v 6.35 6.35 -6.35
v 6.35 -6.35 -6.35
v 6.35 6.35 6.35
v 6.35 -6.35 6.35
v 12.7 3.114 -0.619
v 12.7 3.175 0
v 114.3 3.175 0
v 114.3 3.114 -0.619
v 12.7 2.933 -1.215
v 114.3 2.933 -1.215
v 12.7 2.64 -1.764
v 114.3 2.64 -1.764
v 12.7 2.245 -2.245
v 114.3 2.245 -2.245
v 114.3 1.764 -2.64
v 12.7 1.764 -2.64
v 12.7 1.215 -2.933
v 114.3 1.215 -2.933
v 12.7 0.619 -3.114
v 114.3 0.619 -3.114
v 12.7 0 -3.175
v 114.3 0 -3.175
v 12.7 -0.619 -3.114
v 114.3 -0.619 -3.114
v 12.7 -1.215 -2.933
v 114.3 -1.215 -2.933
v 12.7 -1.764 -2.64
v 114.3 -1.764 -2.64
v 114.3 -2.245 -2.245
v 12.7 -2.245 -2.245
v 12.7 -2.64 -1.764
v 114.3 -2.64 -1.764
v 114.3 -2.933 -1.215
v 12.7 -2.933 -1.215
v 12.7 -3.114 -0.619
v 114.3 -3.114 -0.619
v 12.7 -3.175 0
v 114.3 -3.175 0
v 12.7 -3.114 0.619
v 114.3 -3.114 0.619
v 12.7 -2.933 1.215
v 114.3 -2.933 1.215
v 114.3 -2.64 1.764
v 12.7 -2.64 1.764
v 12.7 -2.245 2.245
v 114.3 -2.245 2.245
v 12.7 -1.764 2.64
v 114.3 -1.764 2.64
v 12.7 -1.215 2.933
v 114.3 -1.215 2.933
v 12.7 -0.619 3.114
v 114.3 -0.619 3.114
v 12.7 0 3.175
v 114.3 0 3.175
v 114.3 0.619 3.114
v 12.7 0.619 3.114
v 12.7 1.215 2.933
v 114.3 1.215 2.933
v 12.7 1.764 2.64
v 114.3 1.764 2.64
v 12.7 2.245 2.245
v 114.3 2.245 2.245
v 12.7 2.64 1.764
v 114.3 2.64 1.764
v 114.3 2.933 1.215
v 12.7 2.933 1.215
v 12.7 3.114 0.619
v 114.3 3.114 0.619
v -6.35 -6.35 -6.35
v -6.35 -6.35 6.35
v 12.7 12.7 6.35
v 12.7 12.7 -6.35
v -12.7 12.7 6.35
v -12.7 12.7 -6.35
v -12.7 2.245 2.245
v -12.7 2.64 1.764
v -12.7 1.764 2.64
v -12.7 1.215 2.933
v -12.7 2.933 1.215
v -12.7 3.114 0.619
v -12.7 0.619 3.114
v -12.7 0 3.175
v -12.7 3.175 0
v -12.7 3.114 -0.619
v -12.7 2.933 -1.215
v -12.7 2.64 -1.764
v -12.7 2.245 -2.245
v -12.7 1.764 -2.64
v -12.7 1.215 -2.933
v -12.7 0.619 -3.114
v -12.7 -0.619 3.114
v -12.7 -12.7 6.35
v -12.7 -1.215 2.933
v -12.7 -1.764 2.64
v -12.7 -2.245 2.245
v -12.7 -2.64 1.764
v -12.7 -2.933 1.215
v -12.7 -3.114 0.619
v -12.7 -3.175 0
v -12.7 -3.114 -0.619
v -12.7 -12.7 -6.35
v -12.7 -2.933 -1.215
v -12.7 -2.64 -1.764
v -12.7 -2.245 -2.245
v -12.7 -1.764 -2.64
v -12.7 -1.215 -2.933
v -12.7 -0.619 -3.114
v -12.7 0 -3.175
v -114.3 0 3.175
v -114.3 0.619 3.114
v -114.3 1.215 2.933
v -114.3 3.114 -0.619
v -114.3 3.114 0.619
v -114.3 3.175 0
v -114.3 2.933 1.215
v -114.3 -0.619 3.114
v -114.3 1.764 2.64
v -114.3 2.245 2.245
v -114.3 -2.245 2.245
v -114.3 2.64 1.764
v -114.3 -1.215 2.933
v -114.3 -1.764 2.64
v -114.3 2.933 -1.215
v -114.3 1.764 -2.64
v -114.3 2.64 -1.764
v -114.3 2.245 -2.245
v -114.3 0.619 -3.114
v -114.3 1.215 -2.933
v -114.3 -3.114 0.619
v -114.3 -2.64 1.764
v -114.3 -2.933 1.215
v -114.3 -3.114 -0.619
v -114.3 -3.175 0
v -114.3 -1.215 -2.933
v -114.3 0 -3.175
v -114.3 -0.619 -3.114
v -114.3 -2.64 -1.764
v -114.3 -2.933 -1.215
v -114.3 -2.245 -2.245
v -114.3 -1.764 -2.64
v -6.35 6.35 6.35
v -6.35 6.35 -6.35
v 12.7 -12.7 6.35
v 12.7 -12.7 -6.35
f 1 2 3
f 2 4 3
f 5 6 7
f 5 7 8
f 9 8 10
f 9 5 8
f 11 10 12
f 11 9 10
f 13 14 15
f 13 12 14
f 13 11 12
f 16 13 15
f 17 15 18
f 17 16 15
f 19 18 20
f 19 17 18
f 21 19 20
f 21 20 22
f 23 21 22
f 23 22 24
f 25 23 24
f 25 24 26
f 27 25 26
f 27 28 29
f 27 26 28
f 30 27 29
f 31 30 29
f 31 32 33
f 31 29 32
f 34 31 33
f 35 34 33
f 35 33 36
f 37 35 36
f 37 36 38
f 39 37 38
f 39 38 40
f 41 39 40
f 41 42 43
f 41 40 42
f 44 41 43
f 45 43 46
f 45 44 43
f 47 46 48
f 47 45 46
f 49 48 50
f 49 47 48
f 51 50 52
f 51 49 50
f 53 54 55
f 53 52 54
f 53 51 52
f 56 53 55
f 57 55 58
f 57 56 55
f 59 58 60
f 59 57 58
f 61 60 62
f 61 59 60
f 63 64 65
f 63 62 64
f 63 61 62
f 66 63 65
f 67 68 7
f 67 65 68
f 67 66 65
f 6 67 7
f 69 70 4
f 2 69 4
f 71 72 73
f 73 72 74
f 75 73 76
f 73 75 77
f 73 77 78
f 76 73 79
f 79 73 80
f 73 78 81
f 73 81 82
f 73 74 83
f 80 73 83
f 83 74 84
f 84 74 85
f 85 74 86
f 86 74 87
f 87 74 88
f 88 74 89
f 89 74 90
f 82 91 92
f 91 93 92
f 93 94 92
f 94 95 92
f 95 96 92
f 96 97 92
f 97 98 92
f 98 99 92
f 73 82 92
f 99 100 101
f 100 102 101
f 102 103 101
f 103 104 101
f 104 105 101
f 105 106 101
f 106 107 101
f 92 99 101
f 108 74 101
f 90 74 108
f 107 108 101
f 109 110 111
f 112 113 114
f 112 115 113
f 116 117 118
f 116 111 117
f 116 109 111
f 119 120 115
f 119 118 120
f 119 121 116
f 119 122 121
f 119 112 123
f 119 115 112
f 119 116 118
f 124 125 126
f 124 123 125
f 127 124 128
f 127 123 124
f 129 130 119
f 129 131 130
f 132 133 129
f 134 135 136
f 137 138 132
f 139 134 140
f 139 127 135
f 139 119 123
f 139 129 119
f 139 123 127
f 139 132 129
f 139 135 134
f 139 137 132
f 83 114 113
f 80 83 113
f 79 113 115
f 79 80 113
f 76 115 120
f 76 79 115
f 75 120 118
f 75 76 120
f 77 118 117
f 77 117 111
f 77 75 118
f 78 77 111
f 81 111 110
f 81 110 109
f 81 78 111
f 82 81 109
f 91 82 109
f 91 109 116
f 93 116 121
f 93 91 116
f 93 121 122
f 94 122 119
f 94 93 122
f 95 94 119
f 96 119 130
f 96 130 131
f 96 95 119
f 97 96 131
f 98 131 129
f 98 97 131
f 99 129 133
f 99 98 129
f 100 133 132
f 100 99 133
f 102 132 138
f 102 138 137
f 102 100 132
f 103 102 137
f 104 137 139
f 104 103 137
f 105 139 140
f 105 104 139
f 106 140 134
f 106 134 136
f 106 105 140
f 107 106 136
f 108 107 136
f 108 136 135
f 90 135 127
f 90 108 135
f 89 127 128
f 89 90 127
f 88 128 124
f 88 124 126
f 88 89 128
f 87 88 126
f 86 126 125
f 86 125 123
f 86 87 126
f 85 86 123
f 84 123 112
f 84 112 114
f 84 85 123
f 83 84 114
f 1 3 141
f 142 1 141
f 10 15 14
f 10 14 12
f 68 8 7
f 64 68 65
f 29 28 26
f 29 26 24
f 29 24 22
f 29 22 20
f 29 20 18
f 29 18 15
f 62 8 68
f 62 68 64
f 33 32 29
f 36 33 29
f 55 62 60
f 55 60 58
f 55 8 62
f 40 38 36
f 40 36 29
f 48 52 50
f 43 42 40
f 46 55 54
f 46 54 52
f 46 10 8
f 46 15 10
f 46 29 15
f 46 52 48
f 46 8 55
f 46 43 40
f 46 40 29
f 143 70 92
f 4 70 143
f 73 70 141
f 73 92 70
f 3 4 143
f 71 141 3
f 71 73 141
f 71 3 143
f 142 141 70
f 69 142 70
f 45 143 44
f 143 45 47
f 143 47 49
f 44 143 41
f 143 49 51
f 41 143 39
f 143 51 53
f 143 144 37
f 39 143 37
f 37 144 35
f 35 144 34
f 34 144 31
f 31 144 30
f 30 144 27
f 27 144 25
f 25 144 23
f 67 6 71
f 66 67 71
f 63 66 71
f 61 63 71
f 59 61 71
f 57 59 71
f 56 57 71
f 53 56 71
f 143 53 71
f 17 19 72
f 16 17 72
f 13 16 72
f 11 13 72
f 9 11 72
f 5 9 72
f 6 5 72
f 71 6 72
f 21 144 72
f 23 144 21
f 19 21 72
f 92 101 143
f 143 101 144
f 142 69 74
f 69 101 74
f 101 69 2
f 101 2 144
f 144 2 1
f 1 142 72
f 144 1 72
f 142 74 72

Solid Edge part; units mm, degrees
sketch "Sketch1" plane through (0, 0, 0) normal (0, 0, 1) x (1, 0, 0)
  line L0 (-12.7, -12.7) -> (12.7, -12.7)
  line L1 (12.7, -12.7) -> (12.7, 12.7)
  line L2 (12.7, 12.7) -> (-12.7, 12.7)
  line L3 (-12.7, 12.7) -> (-12.7, -12.7)
  dimension "D1" = 25.4
  dimension "D2" = 25.4
  dimension "D3" = 12.7
  dimension "D4" = 12.7
extrude "Protrusion1" add sketch "Sketch1" along normal mid plane 12.7
sketch "Sketch2" plane through (12.7, 0, 0) normal (1, 0, 0) x (0, 1, 0)
  circle A0 centre (0, 0) radius 3.175
  dimension "D1" = 6.35
extrude "ExtrudedProtrusion_3" add sketch "Sketch2" along normal blind 101.6
mirror "Mirror1" about plane through (0, 0, 0) normal (1, 0, 0) of "ExtrudedProtrusion_3"
sketch "Sketch3" plane through (0, 0, 6.35) normal (0, 0, 1) x (1, 0, 0)
  line L0 (-6.35, -6.35) -> (6.35, -6.35)
  line L1 (6.35, -6.35) -> (6.35, 6.35)
  line L2 (6.35, 6.35) -> (-6.35, 6.35)
  line L3 (-6.35, 6.35) -> (-6.35, -6.35)
  dimension "D1" = 12.7
  dimension "D2" = 12.7
  dimension "D3" = 6.35
  dimension "D4" = 6.35
extrude "Cutout1" cut sketch "Sketch3" against normal through all
